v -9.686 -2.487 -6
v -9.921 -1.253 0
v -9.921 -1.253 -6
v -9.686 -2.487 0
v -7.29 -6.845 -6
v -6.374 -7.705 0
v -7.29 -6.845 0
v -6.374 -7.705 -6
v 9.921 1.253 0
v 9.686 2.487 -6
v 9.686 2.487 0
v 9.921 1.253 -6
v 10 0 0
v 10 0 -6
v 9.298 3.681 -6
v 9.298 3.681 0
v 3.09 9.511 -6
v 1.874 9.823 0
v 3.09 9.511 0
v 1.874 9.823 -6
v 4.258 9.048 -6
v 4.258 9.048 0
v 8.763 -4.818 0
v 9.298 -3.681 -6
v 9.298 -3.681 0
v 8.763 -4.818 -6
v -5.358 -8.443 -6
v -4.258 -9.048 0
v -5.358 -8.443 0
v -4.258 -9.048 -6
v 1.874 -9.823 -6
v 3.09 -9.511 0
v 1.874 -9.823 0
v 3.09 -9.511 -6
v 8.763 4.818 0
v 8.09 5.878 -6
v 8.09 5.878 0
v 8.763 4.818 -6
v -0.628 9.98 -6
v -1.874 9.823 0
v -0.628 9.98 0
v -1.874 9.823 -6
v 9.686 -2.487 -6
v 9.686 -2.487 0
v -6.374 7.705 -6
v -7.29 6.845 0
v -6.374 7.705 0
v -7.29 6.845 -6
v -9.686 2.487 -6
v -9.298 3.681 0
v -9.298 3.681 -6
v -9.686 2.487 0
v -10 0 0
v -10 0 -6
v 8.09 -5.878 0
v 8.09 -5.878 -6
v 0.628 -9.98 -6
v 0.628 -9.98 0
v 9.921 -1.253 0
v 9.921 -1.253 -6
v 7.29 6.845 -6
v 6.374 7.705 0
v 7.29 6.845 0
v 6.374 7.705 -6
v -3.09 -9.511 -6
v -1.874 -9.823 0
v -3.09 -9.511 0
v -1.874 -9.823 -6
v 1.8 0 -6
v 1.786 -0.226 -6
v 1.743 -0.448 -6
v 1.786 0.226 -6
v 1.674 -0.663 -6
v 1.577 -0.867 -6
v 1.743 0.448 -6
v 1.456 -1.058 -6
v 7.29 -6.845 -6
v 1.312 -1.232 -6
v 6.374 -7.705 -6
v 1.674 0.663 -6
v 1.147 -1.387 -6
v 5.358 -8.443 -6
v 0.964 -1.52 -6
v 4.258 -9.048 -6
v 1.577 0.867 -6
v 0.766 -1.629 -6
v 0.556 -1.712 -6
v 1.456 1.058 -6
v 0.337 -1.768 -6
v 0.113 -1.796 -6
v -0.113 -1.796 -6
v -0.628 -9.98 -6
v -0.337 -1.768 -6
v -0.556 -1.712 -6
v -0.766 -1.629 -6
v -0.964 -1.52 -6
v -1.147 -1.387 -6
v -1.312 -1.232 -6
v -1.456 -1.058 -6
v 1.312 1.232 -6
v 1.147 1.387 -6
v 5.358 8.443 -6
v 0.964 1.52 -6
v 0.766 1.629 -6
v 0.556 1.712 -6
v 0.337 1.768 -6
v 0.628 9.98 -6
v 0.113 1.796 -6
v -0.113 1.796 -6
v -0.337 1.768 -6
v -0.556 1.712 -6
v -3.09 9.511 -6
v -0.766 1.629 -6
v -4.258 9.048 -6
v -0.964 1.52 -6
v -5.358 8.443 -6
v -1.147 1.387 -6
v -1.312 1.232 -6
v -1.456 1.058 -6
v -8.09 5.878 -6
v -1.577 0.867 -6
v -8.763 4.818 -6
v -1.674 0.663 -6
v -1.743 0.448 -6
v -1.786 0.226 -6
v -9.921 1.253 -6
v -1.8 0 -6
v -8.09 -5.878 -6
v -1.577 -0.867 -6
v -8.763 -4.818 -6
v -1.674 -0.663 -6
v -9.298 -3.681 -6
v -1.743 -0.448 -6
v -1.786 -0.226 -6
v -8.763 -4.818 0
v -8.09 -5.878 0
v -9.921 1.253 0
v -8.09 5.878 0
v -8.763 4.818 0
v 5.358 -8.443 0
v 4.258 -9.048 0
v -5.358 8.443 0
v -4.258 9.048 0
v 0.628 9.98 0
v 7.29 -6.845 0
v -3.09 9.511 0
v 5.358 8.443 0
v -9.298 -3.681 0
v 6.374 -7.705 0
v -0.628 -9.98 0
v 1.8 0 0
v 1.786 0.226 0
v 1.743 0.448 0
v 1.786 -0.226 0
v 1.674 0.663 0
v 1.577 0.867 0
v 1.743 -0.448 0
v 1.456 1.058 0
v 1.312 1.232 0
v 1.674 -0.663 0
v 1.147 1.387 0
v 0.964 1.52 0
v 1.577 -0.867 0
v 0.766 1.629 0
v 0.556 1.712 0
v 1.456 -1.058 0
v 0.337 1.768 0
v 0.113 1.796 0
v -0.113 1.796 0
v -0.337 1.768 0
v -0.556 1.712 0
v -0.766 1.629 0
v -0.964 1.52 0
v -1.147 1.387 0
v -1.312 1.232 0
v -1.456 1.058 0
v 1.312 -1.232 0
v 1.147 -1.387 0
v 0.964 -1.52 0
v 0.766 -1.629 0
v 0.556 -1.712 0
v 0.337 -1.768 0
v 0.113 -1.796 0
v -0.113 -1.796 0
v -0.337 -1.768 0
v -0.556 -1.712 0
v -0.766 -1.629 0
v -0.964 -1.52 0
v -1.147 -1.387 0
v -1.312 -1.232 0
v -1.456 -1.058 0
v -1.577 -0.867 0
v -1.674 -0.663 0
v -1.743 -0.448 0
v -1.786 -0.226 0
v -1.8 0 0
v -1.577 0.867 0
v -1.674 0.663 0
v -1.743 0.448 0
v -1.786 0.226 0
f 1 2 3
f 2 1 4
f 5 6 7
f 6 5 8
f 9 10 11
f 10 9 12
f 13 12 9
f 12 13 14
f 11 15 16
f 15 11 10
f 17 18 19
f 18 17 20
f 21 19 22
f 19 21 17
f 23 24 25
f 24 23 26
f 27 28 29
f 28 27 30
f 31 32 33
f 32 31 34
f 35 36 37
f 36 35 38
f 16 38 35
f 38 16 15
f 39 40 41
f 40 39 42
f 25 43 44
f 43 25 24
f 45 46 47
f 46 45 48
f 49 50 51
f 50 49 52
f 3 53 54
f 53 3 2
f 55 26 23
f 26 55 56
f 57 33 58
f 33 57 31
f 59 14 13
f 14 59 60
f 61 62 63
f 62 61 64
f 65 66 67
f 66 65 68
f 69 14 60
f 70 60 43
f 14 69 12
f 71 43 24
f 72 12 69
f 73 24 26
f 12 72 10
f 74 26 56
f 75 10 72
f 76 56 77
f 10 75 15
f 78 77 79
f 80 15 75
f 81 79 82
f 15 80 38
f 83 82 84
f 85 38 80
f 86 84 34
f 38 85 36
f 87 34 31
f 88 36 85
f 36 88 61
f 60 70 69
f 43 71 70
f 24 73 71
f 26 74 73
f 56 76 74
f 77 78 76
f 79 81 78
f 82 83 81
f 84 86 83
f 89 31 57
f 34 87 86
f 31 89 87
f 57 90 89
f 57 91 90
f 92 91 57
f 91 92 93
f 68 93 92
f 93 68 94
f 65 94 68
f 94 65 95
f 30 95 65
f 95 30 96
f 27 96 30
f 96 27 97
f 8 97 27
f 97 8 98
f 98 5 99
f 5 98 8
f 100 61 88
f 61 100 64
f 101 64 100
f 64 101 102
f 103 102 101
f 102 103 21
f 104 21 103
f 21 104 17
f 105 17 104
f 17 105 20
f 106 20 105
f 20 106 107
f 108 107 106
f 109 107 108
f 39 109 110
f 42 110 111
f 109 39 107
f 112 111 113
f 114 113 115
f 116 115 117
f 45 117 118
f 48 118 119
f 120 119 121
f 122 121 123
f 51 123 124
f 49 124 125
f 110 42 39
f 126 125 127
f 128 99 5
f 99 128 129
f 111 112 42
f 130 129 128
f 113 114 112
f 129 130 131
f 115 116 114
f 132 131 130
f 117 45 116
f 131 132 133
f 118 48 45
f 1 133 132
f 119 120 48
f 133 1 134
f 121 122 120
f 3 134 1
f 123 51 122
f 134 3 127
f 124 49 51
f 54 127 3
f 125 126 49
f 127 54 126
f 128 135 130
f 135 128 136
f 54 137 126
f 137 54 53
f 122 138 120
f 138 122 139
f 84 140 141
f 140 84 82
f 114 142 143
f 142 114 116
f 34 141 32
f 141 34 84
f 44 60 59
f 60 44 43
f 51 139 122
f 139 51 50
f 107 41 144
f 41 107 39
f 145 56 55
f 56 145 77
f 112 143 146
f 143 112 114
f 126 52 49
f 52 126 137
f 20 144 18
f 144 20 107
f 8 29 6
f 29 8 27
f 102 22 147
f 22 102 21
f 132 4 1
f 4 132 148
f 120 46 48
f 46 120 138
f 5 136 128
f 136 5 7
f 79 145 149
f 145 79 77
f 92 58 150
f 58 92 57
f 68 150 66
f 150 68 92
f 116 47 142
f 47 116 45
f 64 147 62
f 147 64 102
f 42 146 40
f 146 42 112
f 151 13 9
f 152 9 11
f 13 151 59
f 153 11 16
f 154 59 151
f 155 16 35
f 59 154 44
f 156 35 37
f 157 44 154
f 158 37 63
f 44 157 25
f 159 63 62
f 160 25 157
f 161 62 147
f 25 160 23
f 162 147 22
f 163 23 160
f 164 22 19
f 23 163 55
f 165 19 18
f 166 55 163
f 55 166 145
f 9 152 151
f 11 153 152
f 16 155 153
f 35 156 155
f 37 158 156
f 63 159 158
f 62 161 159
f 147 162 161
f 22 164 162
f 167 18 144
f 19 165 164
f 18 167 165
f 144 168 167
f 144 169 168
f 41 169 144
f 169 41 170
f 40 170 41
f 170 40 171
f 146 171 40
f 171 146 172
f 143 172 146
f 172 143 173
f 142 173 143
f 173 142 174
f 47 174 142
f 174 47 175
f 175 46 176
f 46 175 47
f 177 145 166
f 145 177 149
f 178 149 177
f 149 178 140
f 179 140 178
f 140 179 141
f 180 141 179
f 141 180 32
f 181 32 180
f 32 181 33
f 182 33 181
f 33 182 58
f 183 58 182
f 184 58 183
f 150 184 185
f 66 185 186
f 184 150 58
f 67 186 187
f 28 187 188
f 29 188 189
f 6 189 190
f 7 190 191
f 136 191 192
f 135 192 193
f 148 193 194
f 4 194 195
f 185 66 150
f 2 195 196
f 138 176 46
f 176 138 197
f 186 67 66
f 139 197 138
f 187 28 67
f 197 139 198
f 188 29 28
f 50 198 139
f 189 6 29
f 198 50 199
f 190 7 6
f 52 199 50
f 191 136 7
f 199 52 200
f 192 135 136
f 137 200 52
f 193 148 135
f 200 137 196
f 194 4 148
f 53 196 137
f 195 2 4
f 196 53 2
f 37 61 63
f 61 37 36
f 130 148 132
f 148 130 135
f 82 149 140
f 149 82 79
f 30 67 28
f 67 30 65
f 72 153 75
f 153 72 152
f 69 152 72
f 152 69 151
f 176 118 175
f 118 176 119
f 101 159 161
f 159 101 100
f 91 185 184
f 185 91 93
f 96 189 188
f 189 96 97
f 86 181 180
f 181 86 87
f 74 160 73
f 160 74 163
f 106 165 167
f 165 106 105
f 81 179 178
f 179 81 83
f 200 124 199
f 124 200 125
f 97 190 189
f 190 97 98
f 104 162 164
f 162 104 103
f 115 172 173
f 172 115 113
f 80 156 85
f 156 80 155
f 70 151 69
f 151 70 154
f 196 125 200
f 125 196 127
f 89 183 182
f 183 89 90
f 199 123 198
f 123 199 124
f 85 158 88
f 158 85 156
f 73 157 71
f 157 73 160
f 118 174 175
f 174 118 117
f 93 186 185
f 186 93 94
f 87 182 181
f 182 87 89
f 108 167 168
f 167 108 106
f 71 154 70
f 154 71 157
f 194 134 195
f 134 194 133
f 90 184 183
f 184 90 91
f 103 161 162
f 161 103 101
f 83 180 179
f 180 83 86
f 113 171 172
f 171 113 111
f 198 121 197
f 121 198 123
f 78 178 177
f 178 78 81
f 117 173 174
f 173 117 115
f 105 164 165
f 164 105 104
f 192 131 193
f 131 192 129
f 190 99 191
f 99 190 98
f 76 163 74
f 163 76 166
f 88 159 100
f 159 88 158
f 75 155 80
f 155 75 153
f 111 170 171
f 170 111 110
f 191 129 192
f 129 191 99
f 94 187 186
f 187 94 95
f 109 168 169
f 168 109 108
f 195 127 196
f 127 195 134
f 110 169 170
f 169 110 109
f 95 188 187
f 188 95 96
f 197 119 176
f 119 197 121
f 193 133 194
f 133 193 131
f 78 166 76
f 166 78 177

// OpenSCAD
$fn = 50;


difference() {
	union() {
		translate(v = [0, 0, -6.0000000000]) {
			cylinder(h = 6, r = 10.0000000000);
		}
		cylinder(h = 0, r = 19.0000000000);
	}
	union() {
		#translate(v = [0, 0, -6]) {
			cylinder(h = 6, r = 1.8000000000);
		}
	}
}
